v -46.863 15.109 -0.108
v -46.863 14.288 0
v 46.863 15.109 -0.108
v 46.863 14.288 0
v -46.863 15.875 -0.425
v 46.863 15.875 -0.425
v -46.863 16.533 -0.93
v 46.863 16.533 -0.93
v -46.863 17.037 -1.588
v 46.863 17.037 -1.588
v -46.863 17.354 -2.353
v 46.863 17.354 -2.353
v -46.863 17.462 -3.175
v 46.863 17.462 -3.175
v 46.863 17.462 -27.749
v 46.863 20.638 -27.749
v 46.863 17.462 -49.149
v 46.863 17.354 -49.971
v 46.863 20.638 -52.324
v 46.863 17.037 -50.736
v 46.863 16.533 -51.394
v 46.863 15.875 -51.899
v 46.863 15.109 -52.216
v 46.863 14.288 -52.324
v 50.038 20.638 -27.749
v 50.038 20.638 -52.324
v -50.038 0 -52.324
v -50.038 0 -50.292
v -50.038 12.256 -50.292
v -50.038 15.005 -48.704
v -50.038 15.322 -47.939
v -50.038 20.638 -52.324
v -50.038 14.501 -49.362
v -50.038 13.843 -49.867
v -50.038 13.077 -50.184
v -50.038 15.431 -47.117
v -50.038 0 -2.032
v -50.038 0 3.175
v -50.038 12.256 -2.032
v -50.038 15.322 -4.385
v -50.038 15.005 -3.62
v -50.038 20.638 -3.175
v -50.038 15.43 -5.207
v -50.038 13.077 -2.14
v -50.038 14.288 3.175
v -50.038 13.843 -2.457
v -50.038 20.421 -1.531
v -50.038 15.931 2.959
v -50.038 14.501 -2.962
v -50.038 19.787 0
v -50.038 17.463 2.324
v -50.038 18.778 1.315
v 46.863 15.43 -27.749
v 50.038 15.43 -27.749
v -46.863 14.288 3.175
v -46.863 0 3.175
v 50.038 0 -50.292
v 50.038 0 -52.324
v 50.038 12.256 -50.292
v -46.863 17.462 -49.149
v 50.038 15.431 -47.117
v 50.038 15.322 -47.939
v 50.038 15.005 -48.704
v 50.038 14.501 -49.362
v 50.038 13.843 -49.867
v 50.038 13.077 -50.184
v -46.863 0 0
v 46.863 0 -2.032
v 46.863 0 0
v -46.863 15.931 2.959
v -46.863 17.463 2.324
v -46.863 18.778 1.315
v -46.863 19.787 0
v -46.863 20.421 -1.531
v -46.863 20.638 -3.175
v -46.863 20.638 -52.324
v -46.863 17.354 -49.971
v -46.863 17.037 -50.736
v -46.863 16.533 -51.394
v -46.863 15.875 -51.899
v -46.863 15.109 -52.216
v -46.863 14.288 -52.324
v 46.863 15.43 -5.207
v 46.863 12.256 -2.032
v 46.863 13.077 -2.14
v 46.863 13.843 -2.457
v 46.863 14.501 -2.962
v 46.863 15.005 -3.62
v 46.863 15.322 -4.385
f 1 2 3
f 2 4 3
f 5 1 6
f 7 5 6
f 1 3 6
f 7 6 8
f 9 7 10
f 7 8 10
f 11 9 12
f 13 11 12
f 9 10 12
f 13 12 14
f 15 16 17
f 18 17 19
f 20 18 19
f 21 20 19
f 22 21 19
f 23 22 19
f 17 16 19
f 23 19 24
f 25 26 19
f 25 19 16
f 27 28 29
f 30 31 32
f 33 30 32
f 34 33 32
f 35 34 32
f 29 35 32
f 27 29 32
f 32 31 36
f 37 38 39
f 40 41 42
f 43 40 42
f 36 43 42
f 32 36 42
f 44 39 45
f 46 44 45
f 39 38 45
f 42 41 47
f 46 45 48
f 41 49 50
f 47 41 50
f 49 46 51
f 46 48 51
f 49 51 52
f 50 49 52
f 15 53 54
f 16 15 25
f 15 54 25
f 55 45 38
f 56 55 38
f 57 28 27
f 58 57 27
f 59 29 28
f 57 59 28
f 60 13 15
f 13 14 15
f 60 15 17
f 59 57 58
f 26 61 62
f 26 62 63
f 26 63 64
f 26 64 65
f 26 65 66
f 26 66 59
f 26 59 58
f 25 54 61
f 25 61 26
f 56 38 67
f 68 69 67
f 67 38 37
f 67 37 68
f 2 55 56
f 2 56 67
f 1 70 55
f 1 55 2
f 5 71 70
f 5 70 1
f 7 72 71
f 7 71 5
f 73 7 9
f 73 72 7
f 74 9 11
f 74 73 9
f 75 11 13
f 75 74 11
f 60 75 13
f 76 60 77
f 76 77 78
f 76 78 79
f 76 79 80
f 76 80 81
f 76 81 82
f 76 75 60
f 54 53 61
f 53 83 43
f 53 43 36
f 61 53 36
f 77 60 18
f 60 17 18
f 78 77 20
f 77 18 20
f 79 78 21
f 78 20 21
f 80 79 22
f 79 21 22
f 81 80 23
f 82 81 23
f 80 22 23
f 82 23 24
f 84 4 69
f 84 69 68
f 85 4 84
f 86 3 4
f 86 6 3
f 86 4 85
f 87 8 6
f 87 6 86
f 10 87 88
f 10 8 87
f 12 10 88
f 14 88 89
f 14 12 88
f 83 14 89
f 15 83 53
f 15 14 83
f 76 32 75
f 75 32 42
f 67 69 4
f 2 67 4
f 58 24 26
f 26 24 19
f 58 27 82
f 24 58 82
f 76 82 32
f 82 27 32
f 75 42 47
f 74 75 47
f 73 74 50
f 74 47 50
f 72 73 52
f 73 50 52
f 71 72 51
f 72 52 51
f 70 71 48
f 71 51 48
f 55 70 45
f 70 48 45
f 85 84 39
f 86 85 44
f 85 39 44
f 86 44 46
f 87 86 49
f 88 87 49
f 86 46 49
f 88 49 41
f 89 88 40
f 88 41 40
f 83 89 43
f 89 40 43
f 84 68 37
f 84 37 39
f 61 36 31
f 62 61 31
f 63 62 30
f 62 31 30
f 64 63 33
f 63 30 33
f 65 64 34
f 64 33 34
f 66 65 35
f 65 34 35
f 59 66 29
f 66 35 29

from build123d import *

# Parameters (mm, degrees)
EXTRUDE_THIN1_DEPTH = 46.863
BOSS_EXTRUDE1_START = 3.175
BOSS_EXTRUDE1_DEPTH = 3.175
FILLET1_START       = -50.038
FILLET1_DEPTH       = 100.076
FILLET2_START       = -50.038
FILLET2_DEPTH       = 100.076
SKETCH4_W           = 30.9245
SKETCH4_H           = 20.6375
CUT_EXTRUDE1_DEPTH  = 3.175


with BuildPart() as part:
    # Sketch2 → Extrude-Thin1 (new, symmetric)
    with BuildSketch(Plane(origin=(0, 0, 0), x_dir=(0, 0, -1), z_dir=(1, 0, 0))):
        with BuildLine():
            Line((0, 0), (0, 14.2875))
            ThreePointArc((0, 14.2875), (0.92993597, 16.53256403), (3.175, 17.4625))
            Line((3.175, 17.4625), (49.149, 17.4625))
            ThreePointArc((49.149, 17.4625), (51.39406403, 16.53256403), (52.324, 14.2875))
            Line((52.324, 14.2875), (52.324, 0))
            Line((52.324, 0), (50.292, 0))
            Line((50.292, 0), (50.292, 14.2875))
            ThreePointArc((50.292, 14.2875), (49.957223051, 15.095723051), (49.149, 15.4305))
            Line((49.149, 15.4305), (3.175, 15.4305))
            ThreePointArc((3.175, 15.4305), (2.366776949, 15.095723051), (2.032, 14.2875))
            Line((2.032, 14.2875), (2.032, 0))
            Line((2.032, 0), (0, 0))
        make_face()
    extrude(amount=EXTRUDE_THIN1_DEPTH, both=True)

    # Sketch3 → Boss-Extrude1 (add)
    with BuildSketch(Plane(origin=(46.863, 0, 0), x_dir=(0, 0, -1), z_dir=(1, 0, 0)).offset(BOSS_EXTRUDE1_START)):
        with BuildLine():
            Line((52.324, 20.6375), (3.175, 20.6375))
            ThreePointArc((3.175, 20.6375), (-1.315128061, 18.777628061), (-3.175, 14.2875))
            Line((-3.175, 14.2875), (-3.175, 0))
            Line((-3.175, 0), (0, 0))
            Line((0, 0), (2.032, 0))
            Line((2.032, 0), (2.032, 14.2875))
            ThreePointArc((2.032, 14.2875), (2.366776949, 15.095723051), (3.175, 15.4305))
            Line((3.175, 15.4305), (49.149, 15.4305))
            ThreePointArc((49.149, 15.4305), (49.957223051, 15.095723051), (50.292, 14.2875))
            Line((50.292, 14.2875), (50.292, 0))
            Line((50.292, 0), (52.324, 0))
            Line((52.324, 0), (52.324, 14.2875))
            Line((52.324, 14.2875), (52.324, 20.6375))
        make_face()
    boss_extrude1 = extrude(amount=-BOSS_EXTRUDE1_DEPTH)

    # Mirror1: Boss-Extrude1 across plane
    add(boss_extrude1.mirror(Plane(origin=(0, 0, 0), x_dir=(0, 0, 1), z_dir=(1, 0, 0))))

    # Fillet1: read off the stored shape, not the designer's step
    # Fillet1 outline → Fillet1 (add)
    with BuildSketch(Plane.YZ.offset(FILLET1_START)):
        with BuildLine():
            ThreePointArc((15.4305, -47.117), (14.50056403, -49.36206403), (12.2555, -50.292))
            Line((12.2555, -50.292), (14.2875, -50.292))
            ThreePointArc((14.2875, -50.292), (15.095723051, -49.957223051), (15.4305, -49.149))
            Line((15.4305, -49.149), (15.4305, -47.117))
        make_face()
    extrude(amount=FILLET1_DEPTH)

    # Fillet2: read off the stored shape, not the designer's step
    # Fillet2 outline → Fillet2 (add)
    with BuildSketch(Plane.YZ.offset(FILLET2_START)):
        with BuildLine():
            ThreePointArc((12.2555, -2.032), (14.50056403, -2.96193597), (15.4305, -5.207))
            Line((15.4305, -5.207), (15.4305, -3.175))
            ThreePointArc((15.4305, -3.175), (15.095723051, -2.366776949), (14.2875, -2.032))
            Line((14.2875, -2.032), (12.2555, -2.032))
        make_face()
    extrude(amount=FILLET2_DEPTH)

    # Sketch4 → Cut-Extrude1 (cut)
    with BuildSketch(Plane(origin=(50.038, 0, 0), x_dir=(0, 0, -1), z_dir=(1, 0, 0))):
        with Locations((12.28725, 10.31875)):
            Rectangle(SKETCH4_W, SKETCH4_H)
    extrude(amount=-CUT_EXTRUDE1_DEPTH, mode=Mode.SUBTRACT)


solid = part.part
